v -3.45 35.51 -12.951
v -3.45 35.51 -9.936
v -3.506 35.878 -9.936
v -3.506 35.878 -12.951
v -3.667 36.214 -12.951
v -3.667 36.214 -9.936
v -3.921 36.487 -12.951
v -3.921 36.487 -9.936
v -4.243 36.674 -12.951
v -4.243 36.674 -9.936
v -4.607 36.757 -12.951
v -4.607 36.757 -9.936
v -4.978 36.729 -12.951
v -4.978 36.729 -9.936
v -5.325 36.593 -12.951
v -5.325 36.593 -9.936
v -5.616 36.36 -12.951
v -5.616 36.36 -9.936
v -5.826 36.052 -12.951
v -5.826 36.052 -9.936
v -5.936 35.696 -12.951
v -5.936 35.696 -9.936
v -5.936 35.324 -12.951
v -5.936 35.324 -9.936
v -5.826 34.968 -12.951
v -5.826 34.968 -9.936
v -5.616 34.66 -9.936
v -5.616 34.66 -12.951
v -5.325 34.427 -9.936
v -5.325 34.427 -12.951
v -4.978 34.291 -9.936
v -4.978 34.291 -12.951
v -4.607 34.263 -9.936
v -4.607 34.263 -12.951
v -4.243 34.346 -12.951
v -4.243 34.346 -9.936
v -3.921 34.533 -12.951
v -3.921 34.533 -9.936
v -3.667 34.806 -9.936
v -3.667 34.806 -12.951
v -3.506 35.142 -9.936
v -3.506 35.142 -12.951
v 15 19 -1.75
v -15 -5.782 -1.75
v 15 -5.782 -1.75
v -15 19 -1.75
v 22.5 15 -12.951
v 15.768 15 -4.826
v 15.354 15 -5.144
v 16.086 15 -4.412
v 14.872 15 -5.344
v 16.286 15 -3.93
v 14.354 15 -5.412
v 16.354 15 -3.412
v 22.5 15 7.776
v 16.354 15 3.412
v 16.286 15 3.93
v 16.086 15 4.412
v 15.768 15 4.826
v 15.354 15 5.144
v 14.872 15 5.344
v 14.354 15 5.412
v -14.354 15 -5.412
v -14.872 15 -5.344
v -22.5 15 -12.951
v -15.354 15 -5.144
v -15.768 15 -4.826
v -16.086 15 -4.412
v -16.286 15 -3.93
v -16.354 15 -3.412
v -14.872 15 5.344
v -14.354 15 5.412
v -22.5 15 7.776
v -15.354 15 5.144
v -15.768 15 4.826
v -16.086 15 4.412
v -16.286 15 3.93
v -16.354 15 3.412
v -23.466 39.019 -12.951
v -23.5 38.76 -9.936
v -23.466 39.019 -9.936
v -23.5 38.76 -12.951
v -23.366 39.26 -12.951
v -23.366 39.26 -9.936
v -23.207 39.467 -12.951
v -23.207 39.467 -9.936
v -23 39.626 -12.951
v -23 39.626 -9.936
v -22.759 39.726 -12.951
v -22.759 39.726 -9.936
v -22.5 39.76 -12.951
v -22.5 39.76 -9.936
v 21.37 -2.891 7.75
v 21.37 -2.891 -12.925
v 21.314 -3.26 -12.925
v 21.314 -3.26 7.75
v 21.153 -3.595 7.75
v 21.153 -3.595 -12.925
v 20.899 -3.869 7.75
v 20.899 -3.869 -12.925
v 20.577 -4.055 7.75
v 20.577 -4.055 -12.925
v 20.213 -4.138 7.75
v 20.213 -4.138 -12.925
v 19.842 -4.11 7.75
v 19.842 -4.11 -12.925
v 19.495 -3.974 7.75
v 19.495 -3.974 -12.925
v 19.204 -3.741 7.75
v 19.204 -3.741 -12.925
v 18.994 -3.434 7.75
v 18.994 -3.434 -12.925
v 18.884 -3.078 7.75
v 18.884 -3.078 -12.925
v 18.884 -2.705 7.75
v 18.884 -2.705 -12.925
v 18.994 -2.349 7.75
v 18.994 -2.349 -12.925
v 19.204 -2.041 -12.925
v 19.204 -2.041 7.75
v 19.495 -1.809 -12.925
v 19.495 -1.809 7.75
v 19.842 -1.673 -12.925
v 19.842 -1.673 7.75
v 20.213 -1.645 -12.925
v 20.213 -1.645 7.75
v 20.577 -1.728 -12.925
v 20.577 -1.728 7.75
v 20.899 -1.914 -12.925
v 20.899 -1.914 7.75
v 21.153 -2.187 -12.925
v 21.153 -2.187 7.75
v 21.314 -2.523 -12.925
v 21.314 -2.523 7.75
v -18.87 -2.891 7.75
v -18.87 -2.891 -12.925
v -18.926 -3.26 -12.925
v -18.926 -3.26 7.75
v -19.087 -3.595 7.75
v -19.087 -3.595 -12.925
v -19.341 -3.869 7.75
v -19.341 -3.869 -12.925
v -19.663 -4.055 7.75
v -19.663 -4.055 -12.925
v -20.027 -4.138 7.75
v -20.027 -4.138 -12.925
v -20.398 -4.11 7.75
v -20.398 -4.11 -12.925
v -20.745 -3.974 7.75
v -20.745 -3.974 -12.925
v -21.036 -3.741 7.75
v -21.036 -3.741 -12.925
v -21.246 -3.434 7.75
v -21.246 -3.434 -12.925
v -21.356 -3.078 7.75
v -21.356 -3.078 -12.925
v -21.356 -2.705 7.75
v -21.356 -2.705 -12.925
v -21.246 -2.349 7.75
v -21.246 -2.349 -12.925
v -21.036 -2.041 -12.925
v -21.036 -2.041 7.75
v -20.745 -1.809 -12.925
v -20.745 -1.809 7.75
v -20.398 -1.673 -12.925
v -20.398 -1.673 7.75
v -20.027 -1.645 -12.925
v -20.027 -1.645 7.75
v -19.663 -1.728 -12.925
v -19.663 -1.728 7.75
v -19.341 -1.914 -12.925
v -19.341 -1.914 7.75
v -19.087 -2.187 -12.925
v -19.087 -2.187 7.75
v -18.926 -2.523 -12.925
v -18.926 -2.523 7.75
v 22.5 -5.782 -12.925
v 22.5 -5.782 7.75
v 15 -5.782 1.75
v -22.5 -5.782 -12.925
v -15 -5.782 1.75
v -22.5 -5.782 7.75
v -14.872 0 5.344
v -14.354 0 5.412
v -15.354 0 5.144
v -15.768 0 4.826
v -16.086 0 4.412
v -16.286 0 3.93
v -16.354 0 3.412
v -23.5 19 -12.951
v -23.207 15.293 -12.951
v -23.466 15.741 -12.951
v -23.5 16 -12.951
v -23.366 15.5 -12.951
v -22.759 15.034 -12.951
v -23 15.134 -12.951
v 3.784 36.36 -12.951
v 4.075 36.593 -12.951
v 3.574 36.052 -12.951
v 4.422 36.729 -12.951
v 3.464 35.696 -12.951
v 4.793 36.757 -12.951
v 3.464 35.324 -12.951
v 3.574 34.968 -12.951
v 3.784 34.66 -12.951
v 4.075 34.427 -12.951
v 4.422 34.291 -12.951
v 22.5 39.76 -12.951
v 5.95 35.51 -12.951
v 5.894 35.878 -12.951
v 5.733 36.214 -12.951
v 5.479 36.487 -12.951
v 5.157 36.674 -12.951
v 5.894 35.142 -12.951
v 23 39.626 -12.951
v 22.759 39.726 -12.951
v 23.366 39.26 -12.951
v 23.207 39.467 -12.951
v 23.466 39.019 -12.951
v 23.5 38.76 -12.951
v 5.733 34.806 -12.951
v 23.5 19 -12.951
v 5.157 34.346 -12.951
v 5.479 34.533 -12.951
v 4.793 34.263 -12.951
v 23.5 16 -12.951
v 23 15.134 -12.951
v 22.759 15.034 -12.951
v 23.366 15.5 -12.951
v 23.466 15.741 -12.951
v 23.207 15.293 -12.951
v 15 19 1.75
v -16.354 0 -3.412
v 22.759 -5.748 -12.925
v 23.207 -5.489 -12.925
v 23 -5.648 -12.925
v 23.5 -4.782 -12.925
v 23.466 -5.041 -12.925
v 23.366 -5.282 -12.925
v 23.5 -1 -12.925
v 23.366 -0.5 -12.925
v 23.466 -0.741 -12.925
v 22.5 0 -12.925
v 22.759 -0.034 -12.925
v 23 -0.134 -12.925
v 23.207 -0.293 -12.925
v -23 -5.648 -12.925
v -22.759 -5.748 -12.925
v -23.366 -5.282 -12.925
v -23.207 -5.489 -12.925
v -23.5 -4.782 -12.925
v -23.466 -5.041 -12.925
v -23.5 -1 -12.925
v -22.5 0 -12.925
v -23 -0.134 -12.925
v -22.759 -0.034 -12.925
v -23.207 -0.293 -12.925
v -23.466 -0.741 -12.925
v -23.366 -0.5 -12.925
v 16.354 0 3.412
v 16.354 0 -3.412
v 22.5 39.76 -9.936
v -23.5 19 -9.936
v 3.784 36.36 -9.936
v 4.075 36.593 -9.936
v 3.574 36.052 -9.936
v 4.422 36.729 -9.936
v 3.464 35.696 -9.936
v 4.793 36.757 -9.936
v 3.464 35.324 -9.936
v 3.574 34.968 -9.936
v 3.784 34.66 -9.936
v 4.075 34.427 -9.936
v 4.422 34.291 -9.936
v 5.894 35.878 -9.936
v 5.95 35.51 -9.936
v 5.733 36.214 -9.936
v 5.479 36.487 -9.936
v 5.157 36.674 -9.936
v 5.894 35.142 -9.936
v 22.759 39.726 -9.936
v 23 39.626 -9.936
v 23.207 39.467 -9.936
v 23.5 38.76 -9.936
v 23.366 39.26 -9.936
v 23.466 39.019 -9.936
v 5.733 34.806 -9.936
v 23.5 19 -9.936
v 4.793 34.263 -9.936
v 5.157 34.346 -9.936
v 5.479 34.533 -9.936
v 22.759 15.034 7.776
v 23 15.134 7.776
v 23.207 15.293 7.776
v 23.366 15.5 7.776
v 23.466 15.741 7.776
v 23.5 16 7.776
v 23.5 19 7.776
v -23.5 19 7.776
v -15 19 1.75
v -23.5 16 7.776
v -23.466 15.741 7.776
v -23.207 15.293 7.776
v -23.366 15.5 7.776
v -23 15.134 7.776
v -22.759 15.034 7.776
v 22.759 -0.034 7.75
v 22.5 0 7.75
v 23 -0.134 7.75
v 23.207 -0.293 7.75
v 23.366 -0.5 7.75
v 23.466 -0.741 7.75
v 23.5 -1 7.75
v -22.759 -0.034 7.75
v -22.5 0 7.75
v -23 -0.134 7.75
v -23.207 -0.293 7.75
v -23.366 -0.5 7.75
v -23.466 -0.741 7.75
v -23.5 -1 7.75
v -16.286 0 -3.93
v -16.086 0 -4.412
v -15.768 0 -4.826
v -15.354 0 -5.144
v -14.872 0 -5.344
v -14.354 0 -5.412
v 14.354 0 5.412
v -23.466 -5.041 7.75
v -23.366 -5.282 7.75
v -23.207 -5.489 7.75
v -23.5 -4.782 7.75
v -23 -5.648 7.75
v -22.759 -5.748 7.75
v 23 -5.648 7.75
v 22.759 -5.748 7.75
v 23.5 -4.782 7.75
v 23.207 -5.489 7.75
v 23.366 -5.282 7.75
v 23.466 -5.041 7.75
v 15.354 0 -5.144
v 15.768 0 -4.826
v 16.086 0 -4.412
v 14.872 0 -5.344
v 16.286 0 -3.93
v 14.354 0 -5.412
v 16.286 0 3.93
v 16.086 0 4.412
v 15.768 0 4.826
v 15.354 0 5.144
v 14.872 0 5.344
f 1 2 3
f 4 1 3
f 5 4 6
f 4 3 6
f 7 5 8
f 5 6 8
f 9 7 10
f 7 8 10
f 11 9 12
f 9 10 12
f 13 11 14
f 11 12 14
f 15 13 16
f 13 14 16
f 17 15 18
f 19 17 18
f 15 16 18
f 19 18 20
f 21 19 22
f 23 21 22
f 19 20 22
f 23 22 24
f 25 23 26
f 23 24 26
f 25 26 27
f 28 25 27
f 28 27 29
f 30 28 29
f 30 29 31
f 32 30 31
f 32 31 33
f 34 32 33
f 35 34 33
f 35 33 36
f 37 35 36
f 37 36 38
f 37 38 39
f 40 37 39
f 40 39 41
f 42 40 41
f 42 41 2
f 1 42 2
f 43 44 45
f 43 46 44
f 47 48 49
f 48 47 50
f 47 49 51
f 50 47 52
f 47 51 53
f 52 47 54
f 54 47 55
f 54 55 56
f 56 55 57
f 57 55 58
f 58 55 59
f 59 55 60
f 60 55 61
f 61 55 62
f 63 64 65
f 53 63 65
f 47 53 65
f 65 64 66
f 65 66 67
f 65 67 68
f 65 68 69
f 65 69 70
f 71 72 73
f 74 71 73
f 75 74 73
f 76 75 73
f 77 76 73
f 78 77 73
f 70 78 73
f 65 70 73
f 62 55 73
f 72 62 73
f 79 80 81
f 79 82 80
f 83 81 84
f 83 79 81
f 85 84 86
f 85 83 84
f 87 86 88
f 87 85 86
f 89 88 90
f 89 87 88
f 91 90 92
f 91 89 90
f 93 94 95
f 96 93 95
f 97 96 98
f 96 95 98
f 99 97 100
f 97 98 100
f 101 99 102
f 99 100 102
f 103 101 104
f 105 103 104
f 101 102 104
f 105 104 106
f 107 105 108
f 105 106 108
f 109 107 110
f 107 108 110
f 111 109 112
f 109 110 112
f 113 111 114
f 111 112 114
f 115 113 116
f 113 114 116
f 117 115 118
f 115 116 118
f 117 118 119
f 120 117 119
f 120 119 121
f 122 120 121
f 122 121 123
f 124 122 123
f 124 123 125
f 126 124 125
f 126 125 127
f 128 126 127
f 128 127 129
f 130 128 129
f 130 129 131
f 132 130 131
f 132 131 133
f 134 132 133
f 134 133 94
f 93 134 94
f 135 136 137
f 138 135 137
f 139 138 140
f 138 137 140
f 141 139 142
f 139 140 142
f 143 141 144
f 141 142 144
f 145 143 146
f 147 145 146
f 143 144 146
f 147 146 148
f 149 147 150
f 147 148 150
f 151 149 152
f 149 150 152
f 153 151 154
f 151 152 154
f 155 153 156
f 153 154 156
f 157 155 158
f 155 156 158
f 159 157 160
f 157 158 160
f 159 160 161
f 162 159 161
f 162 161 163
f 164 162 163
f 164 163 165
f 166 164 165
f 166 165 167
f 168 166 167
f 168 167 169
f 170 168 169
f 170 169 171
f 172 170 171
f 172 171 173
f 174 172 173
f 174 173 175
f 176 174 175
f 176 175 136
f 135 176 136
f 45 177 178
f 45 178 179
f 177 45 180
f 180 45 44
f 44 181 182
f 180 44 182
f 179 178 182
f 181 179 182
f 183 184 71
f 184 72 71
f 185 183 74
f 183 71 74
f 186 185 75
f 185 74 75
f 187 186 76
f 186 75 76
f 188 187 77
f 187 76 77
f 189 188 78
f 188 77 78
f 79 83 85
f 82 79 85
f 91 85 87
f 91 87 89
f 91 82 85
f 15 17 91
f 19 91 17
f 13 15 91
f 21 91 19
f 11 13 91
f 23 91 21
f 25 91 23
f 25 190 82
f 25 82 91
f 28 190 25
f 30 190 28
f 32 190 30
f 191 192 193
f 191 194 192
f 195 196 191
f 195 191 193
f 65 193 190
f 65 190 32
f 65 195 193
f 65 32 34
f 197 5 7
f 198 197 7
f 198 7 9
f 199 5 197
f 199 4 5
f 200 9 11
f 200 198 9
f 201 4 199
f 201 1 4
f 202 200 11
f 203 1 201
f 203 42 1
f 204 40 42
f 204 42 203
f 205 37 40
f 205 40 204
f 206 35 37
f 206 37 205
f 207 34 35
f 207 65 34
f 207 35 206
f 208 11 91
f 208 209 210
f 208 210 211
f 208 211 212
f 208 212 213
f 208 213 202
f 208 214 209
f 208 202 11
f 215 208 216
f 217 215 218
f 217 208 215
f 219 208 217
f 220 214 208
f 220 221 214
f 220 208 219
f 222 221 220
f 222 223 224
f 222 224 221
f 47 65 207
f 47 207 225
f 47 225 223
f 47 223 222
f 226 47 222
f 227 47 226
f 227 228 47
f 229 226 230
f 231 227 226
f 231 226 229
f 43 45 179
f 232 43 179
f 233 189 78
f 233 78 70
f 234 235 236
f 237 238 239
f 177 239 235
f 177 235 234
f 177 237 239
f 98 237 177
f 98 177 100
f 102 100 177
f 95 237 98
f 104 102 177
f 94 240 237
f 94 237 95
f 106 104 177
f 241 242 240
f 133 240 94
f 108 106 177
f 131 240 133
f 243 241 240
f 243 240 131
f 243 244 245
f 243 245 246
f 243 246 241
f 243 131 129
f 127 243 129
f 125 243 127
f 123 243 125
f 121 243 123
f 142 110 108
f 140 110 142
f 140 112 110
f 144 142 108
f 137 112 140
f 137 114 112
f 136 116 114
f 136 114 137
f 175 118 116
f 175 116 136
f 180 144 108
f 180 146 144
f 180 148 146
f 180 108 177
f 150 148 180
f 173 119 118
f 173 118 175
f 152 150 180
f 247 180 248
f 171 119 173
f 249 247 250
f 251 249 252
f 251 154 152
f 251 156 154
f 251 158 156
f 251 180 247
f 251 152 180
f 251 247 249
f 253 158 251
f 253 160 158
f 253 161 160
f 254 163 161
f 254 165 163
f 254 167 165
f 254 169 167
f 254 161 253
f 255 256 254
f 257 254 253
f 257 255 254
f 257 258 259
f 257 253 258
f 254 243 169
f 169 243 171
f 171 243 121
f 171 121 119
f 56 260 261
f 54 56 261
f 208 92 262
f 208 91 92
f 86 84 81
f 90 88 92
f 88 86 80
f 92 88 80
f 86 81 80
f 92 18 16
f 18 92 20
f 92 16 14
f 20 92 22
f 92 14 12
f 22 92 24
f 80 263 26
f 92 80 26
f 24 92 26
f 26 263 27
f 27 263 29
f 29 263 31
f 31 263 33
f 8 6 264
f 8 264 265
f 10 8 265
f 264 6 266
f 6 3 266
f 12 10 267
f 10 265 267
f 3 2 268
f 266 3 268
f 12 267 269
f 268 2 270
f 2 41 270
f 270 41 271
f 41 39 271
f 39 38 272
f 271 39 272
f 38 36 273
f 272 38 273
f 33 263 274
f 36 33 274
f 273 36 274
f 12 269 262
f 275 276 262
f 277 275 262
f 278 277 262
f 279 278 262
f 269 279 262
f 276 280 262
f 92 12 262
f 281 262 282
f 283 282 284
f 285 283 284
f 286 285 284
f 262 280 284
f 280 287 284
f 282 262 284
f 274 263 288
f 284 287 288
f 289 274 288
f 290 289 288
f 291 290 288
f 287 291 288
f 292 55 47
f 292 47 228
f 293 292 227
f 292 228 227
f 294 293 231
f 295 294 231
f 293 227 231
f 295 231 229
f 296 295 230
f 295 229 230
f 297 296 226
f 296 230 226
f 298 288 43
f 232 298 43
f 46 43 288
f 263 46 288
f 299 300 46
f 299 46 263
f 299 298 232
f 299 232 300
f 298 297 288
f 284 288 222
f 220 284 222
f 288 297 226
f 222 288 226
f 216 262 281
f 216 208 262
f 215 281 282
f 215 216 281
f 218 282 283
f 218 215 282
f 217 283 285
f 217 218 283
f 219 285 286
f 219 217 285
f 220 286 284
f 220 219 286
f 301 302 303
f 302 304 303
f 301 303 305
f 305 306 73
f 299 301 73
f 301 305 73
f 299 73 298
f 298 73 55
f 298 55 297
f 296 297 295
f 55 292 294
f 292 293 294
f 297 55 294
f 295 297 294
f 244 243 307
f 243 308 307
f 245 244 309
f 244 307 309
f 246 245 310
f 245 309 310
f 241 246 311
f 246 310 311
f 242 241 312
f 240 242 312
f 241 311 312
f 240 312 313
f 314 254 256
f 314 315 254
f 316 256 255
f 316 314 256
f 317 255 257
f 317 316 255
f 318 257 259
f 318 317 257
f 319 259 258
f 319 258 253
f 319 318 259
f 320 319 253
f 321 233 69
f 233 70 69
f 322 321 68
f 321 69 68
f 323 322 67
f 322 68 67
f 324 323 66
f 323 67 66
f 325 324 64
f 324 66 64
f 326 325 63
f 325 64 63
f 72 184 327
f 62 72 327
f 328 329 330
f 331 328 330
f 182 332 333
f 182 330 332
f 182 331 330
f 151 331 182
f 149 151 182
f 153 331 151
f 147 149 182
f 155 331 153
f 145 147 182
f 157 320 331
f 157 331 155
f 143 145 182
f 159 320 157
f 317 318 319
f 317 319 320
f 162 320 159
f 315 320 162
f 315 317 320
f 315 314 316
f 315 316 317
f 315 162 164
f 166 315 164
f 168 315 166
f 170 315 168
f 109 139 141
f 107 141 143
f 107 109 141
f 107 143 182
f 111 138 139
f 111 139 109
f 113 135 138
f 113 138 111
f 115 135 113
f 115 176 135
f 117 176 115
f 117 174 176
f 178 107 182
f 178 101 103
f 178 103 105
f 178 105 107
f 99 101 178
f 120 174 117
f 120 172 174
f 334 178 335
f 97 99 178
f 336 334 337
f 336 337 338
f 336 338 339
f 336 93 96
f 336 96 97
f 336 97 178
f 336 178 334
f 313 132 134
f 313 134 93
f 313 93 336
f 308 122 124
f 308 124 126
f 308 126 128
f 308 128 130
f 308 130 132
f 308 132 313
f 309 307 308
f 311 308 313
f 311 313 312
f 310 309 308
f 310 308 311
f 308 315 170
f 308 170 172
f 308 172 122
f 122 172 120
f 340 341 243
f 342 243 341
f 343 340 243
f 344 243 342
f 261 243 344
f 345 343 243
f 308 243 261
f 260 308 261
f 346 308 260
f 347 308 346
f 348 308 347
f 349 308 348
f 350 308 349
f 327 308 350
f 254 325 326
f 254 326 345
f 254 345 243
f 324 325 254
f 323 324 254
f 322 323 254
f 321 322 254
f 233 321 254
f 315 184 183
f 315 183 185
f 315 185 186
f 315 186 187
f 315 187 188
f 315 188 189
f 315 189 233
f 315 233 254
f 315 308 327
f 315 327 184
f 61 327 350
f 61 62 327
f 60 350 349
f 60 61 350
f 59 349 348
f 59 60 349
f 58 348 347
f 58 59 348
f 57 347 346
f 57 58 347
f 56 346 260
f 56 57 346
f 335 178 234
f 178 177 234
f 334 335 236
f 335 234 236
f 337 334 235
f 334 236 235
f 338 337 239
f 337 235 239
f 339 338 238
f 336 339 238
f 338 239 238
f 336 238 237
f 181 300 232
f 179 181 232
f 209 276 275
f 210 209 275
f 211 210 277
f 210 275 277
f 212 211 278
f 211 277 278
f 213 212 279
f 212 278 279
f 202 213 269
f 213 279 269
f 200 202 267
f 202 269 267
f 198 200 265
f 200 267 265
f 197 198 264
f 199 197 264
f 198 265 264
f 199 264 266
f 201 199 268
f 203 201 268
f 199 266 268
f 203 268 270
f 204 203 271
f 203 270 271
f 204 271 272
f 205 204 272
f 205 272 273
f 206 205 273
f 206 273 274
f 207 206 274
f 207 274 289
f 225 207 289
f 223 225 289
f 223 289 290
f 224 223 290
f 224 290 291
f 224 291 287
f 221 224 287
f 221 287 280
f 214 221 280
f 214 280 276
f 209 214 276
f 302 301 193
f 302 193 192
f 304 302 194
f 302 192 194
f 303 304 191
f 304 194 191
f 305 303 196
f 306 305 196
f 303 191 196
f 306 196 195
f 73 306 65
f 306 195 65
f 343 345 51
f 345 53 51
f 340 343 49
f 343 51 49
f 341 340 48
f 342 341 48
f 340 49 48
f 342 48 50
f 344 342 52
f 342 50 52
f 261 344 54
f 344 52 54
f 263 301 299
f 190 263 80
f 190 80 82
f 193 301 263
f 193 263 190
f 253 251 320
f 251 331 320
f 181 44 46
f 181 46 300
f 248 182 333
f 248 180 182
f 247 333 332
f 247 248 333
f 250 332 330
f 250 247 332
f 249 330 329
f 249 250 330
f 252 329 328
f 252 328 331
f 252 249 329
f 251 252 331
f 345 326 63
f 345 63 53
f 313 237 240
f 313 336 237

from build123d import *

# Parameters (mm, degrees)
SKETCH1_W             = 32.708231768
SKETCH1_H             = 10.82386404
SKETCH1_W_2           = 30
SKETCH1_H_2           = 3.5
BOSS_EXTRUDE2_DEPTH   = 15
SKETCH4_W             = 47
SKETCH4_H             = 15.552838856
SKETCH4_W_2           = 30
SKETCH4_H_2           = 3.5
BOSS_EXTRUDE4_DEPTH   = 4
SKETCH7_W             = 47
SKETCH7_H             = 15.5
SKETCH7_W_2           = 30
SKETCH7_H_2           = 3.5
BOSS_EXTRUDE5_DEPTH   = 5.782
SKETCH25_W            = 47
SKETCH25_H            = 5.782
BOSS_EXTRUDE9_DEPTH   = 5.175
M3X0_5_TAPPED_HOLE1_D = 2.5
FILLET5_R             = 2
SKETCH26_W            = 47
SKETCH26_H            = 4
BOSS_EXTRUDE10_DEPTH  = 5.175
SKETCH17_W            = 47
SKETCH17_H            = 3.015322823
BOSS_EXTRUDE7_DEPTH   = 20.76
M3X0_5_TAPPED_HOLE2_D = 2.5
FILLET6_R             = 1
FILLET8_R             = 1
FILLET9_R             = 1
FILLET10_R            = 1


with BuildPart() as part:
    # Sketch1 → Boss-Extrude2 (new body)
    with BuildSketch(Plane(origin=(0, 0, 0), x_dir=(1, 0, 0), z_dir=(0, 1, 0))):
        Rectangle(SKETCH1_W, SKETCH1_H)
        Rectangle(SKETCH1_W_2, SKETCH1_H_2, mode=Mode.SUBTRACT)
    extrude(amount=BOSS_EXTRUDE2_DEPTH)

    # Sketch4 → Boss-Extrude4 (add)
    with BuildSketch(Plane(origin=(0, 15, 0), x_dir=(1, 0, 0), z_dir=(0, 1, 0))):
        Rectangle(SKETCH4_W, SKETCH4_H)
        Rectangle(SKETCH4_W_2, SKETCH4_H_2, mode=Mode.SUBTRACT)
    extrude(amount=BOSS_EXTRUDE4_DEPTH)

    # Sketch7 → Boss-Extrude5 (add)
    with BuildSketch(Plane.XZ):
        Rectangle(SKETCH7_W, SKETCH7_H)
        Rectangle(SKETCH7_W_2, SKETCH7_H_2, mode=Mode.SUBTRACT)
    extrude(amount=BOSS_EXTRUDE5_DEPTH)

    # Sketch25 → Boss-Extrude9 (add)
    with BuildSketch(Plane(origin=(0, 0, -7.75), x_dir=(-1, 0, 0), z_dir=(0, 0, -1))):
        with Locations((0, -2.891)):
            Rectangle(SKETCH25_W, SKETCH25_H)
    extrude(amount=BOSS_EXTRUDE9_DEPTH)

    # M3x0.5 Tapped Hole1 (through all)
    with Locations(Plane(origin=(0, 0, 7.75), x_dir=(-1, 0, 0), z_dir=(0, 0, 1))):
        with Locations((20.12, 2.891216796), (-20.12, 2.891216796)):
            Hole(M3X0_5_TAPPED_HOLE1_D / 2)

    # Fillet5
    fillet5_edges = [part.edges().sort_by_distance(p)[0] for p in [
        (16.354115884, 7.5, 5.41193202),
        (-16.354115884, 7.5, 5.41193202),
        (-16.354115884, 7.5, -5.41193202),
        (16.354115884, 7.5, -5.41193202),
    ]]
    fillet(fillet5_edges, radius=FILLET5_R)

    # Sketch26 → Boss-Extrude10 (add)
    with BuildSketch(Plane(origin=(0, 0, -7.776419428), x_dir=(-1, 0, 0), z_dir=(0, 0, -1))):
        with Locations((0, 17)):
            Rectangle(SKETCH26_W, SKETCH26_H)
    extrude(amount=BOSS_EXTRUDE10_DEPTH)

    # Sketch17 → Boss-Extrude7 (add)
    with BuildSketch(Plane(origin=(0, 19, 0), x_dir=(1, 0, 0), z_dir=(0, 1, 0))):
        with Locations((0, 11.443758017)):
            Rectangle(SKETCH17_W, SKETCH17_H)
    extrude(amount=BOSS_EXTRUDE7_DEPTH)

    # M3x0.5 Tapped Hole2 (through all)
    with Locations(Plane(origin=(0, 0, -12.951419428), x_dir=(-1, 0, 0), z_dir=(0, 0, -1))):
        with Locations((-4.7, 35.51), (4.7, 35.51)):
            Hole(M3X0_5_TAPPED_HOLE2_D / 2)

    # Fillet6
    fillet6_edges = [part.edges().sort_by_distance(p)[0] for p in [
        (-23.5, 39.76, -11.443758016),
    ]]
    fillet(fillet6_edges, radius=FILLET6_R)

    # Fillet8
    fillet8_edges = [part.edges().sort_by_distance(p)[0] for p in [
        (23.5, 39.76, -11.443758016),
        (23.5, -5.782, -2.5875),
        (-23.5, -5.782, -2.5875),
        (23.5, 0, -2.5875),
        (-23.5, 0, -2.5875),
    ]]
    fillet(fillet8_edges, radius=FILLET8_R)

    # Fillet9
    fillet9_edges = [part.edges().sort_by_distance(p)[0] for p in [
        (-23.5, 15, -2.5875),
    ]]
    fillet(fillet9_edges, radius=FILLET9_R)

    # Fillet10
    fillet10_edges = [part.edges().sort_by_distance(p)[0] for p in [
        (23.5, 15, -2.5875),
    ]]
    fillet(fillet10_edges, radius=FILLET10_R)


solid = part.part
